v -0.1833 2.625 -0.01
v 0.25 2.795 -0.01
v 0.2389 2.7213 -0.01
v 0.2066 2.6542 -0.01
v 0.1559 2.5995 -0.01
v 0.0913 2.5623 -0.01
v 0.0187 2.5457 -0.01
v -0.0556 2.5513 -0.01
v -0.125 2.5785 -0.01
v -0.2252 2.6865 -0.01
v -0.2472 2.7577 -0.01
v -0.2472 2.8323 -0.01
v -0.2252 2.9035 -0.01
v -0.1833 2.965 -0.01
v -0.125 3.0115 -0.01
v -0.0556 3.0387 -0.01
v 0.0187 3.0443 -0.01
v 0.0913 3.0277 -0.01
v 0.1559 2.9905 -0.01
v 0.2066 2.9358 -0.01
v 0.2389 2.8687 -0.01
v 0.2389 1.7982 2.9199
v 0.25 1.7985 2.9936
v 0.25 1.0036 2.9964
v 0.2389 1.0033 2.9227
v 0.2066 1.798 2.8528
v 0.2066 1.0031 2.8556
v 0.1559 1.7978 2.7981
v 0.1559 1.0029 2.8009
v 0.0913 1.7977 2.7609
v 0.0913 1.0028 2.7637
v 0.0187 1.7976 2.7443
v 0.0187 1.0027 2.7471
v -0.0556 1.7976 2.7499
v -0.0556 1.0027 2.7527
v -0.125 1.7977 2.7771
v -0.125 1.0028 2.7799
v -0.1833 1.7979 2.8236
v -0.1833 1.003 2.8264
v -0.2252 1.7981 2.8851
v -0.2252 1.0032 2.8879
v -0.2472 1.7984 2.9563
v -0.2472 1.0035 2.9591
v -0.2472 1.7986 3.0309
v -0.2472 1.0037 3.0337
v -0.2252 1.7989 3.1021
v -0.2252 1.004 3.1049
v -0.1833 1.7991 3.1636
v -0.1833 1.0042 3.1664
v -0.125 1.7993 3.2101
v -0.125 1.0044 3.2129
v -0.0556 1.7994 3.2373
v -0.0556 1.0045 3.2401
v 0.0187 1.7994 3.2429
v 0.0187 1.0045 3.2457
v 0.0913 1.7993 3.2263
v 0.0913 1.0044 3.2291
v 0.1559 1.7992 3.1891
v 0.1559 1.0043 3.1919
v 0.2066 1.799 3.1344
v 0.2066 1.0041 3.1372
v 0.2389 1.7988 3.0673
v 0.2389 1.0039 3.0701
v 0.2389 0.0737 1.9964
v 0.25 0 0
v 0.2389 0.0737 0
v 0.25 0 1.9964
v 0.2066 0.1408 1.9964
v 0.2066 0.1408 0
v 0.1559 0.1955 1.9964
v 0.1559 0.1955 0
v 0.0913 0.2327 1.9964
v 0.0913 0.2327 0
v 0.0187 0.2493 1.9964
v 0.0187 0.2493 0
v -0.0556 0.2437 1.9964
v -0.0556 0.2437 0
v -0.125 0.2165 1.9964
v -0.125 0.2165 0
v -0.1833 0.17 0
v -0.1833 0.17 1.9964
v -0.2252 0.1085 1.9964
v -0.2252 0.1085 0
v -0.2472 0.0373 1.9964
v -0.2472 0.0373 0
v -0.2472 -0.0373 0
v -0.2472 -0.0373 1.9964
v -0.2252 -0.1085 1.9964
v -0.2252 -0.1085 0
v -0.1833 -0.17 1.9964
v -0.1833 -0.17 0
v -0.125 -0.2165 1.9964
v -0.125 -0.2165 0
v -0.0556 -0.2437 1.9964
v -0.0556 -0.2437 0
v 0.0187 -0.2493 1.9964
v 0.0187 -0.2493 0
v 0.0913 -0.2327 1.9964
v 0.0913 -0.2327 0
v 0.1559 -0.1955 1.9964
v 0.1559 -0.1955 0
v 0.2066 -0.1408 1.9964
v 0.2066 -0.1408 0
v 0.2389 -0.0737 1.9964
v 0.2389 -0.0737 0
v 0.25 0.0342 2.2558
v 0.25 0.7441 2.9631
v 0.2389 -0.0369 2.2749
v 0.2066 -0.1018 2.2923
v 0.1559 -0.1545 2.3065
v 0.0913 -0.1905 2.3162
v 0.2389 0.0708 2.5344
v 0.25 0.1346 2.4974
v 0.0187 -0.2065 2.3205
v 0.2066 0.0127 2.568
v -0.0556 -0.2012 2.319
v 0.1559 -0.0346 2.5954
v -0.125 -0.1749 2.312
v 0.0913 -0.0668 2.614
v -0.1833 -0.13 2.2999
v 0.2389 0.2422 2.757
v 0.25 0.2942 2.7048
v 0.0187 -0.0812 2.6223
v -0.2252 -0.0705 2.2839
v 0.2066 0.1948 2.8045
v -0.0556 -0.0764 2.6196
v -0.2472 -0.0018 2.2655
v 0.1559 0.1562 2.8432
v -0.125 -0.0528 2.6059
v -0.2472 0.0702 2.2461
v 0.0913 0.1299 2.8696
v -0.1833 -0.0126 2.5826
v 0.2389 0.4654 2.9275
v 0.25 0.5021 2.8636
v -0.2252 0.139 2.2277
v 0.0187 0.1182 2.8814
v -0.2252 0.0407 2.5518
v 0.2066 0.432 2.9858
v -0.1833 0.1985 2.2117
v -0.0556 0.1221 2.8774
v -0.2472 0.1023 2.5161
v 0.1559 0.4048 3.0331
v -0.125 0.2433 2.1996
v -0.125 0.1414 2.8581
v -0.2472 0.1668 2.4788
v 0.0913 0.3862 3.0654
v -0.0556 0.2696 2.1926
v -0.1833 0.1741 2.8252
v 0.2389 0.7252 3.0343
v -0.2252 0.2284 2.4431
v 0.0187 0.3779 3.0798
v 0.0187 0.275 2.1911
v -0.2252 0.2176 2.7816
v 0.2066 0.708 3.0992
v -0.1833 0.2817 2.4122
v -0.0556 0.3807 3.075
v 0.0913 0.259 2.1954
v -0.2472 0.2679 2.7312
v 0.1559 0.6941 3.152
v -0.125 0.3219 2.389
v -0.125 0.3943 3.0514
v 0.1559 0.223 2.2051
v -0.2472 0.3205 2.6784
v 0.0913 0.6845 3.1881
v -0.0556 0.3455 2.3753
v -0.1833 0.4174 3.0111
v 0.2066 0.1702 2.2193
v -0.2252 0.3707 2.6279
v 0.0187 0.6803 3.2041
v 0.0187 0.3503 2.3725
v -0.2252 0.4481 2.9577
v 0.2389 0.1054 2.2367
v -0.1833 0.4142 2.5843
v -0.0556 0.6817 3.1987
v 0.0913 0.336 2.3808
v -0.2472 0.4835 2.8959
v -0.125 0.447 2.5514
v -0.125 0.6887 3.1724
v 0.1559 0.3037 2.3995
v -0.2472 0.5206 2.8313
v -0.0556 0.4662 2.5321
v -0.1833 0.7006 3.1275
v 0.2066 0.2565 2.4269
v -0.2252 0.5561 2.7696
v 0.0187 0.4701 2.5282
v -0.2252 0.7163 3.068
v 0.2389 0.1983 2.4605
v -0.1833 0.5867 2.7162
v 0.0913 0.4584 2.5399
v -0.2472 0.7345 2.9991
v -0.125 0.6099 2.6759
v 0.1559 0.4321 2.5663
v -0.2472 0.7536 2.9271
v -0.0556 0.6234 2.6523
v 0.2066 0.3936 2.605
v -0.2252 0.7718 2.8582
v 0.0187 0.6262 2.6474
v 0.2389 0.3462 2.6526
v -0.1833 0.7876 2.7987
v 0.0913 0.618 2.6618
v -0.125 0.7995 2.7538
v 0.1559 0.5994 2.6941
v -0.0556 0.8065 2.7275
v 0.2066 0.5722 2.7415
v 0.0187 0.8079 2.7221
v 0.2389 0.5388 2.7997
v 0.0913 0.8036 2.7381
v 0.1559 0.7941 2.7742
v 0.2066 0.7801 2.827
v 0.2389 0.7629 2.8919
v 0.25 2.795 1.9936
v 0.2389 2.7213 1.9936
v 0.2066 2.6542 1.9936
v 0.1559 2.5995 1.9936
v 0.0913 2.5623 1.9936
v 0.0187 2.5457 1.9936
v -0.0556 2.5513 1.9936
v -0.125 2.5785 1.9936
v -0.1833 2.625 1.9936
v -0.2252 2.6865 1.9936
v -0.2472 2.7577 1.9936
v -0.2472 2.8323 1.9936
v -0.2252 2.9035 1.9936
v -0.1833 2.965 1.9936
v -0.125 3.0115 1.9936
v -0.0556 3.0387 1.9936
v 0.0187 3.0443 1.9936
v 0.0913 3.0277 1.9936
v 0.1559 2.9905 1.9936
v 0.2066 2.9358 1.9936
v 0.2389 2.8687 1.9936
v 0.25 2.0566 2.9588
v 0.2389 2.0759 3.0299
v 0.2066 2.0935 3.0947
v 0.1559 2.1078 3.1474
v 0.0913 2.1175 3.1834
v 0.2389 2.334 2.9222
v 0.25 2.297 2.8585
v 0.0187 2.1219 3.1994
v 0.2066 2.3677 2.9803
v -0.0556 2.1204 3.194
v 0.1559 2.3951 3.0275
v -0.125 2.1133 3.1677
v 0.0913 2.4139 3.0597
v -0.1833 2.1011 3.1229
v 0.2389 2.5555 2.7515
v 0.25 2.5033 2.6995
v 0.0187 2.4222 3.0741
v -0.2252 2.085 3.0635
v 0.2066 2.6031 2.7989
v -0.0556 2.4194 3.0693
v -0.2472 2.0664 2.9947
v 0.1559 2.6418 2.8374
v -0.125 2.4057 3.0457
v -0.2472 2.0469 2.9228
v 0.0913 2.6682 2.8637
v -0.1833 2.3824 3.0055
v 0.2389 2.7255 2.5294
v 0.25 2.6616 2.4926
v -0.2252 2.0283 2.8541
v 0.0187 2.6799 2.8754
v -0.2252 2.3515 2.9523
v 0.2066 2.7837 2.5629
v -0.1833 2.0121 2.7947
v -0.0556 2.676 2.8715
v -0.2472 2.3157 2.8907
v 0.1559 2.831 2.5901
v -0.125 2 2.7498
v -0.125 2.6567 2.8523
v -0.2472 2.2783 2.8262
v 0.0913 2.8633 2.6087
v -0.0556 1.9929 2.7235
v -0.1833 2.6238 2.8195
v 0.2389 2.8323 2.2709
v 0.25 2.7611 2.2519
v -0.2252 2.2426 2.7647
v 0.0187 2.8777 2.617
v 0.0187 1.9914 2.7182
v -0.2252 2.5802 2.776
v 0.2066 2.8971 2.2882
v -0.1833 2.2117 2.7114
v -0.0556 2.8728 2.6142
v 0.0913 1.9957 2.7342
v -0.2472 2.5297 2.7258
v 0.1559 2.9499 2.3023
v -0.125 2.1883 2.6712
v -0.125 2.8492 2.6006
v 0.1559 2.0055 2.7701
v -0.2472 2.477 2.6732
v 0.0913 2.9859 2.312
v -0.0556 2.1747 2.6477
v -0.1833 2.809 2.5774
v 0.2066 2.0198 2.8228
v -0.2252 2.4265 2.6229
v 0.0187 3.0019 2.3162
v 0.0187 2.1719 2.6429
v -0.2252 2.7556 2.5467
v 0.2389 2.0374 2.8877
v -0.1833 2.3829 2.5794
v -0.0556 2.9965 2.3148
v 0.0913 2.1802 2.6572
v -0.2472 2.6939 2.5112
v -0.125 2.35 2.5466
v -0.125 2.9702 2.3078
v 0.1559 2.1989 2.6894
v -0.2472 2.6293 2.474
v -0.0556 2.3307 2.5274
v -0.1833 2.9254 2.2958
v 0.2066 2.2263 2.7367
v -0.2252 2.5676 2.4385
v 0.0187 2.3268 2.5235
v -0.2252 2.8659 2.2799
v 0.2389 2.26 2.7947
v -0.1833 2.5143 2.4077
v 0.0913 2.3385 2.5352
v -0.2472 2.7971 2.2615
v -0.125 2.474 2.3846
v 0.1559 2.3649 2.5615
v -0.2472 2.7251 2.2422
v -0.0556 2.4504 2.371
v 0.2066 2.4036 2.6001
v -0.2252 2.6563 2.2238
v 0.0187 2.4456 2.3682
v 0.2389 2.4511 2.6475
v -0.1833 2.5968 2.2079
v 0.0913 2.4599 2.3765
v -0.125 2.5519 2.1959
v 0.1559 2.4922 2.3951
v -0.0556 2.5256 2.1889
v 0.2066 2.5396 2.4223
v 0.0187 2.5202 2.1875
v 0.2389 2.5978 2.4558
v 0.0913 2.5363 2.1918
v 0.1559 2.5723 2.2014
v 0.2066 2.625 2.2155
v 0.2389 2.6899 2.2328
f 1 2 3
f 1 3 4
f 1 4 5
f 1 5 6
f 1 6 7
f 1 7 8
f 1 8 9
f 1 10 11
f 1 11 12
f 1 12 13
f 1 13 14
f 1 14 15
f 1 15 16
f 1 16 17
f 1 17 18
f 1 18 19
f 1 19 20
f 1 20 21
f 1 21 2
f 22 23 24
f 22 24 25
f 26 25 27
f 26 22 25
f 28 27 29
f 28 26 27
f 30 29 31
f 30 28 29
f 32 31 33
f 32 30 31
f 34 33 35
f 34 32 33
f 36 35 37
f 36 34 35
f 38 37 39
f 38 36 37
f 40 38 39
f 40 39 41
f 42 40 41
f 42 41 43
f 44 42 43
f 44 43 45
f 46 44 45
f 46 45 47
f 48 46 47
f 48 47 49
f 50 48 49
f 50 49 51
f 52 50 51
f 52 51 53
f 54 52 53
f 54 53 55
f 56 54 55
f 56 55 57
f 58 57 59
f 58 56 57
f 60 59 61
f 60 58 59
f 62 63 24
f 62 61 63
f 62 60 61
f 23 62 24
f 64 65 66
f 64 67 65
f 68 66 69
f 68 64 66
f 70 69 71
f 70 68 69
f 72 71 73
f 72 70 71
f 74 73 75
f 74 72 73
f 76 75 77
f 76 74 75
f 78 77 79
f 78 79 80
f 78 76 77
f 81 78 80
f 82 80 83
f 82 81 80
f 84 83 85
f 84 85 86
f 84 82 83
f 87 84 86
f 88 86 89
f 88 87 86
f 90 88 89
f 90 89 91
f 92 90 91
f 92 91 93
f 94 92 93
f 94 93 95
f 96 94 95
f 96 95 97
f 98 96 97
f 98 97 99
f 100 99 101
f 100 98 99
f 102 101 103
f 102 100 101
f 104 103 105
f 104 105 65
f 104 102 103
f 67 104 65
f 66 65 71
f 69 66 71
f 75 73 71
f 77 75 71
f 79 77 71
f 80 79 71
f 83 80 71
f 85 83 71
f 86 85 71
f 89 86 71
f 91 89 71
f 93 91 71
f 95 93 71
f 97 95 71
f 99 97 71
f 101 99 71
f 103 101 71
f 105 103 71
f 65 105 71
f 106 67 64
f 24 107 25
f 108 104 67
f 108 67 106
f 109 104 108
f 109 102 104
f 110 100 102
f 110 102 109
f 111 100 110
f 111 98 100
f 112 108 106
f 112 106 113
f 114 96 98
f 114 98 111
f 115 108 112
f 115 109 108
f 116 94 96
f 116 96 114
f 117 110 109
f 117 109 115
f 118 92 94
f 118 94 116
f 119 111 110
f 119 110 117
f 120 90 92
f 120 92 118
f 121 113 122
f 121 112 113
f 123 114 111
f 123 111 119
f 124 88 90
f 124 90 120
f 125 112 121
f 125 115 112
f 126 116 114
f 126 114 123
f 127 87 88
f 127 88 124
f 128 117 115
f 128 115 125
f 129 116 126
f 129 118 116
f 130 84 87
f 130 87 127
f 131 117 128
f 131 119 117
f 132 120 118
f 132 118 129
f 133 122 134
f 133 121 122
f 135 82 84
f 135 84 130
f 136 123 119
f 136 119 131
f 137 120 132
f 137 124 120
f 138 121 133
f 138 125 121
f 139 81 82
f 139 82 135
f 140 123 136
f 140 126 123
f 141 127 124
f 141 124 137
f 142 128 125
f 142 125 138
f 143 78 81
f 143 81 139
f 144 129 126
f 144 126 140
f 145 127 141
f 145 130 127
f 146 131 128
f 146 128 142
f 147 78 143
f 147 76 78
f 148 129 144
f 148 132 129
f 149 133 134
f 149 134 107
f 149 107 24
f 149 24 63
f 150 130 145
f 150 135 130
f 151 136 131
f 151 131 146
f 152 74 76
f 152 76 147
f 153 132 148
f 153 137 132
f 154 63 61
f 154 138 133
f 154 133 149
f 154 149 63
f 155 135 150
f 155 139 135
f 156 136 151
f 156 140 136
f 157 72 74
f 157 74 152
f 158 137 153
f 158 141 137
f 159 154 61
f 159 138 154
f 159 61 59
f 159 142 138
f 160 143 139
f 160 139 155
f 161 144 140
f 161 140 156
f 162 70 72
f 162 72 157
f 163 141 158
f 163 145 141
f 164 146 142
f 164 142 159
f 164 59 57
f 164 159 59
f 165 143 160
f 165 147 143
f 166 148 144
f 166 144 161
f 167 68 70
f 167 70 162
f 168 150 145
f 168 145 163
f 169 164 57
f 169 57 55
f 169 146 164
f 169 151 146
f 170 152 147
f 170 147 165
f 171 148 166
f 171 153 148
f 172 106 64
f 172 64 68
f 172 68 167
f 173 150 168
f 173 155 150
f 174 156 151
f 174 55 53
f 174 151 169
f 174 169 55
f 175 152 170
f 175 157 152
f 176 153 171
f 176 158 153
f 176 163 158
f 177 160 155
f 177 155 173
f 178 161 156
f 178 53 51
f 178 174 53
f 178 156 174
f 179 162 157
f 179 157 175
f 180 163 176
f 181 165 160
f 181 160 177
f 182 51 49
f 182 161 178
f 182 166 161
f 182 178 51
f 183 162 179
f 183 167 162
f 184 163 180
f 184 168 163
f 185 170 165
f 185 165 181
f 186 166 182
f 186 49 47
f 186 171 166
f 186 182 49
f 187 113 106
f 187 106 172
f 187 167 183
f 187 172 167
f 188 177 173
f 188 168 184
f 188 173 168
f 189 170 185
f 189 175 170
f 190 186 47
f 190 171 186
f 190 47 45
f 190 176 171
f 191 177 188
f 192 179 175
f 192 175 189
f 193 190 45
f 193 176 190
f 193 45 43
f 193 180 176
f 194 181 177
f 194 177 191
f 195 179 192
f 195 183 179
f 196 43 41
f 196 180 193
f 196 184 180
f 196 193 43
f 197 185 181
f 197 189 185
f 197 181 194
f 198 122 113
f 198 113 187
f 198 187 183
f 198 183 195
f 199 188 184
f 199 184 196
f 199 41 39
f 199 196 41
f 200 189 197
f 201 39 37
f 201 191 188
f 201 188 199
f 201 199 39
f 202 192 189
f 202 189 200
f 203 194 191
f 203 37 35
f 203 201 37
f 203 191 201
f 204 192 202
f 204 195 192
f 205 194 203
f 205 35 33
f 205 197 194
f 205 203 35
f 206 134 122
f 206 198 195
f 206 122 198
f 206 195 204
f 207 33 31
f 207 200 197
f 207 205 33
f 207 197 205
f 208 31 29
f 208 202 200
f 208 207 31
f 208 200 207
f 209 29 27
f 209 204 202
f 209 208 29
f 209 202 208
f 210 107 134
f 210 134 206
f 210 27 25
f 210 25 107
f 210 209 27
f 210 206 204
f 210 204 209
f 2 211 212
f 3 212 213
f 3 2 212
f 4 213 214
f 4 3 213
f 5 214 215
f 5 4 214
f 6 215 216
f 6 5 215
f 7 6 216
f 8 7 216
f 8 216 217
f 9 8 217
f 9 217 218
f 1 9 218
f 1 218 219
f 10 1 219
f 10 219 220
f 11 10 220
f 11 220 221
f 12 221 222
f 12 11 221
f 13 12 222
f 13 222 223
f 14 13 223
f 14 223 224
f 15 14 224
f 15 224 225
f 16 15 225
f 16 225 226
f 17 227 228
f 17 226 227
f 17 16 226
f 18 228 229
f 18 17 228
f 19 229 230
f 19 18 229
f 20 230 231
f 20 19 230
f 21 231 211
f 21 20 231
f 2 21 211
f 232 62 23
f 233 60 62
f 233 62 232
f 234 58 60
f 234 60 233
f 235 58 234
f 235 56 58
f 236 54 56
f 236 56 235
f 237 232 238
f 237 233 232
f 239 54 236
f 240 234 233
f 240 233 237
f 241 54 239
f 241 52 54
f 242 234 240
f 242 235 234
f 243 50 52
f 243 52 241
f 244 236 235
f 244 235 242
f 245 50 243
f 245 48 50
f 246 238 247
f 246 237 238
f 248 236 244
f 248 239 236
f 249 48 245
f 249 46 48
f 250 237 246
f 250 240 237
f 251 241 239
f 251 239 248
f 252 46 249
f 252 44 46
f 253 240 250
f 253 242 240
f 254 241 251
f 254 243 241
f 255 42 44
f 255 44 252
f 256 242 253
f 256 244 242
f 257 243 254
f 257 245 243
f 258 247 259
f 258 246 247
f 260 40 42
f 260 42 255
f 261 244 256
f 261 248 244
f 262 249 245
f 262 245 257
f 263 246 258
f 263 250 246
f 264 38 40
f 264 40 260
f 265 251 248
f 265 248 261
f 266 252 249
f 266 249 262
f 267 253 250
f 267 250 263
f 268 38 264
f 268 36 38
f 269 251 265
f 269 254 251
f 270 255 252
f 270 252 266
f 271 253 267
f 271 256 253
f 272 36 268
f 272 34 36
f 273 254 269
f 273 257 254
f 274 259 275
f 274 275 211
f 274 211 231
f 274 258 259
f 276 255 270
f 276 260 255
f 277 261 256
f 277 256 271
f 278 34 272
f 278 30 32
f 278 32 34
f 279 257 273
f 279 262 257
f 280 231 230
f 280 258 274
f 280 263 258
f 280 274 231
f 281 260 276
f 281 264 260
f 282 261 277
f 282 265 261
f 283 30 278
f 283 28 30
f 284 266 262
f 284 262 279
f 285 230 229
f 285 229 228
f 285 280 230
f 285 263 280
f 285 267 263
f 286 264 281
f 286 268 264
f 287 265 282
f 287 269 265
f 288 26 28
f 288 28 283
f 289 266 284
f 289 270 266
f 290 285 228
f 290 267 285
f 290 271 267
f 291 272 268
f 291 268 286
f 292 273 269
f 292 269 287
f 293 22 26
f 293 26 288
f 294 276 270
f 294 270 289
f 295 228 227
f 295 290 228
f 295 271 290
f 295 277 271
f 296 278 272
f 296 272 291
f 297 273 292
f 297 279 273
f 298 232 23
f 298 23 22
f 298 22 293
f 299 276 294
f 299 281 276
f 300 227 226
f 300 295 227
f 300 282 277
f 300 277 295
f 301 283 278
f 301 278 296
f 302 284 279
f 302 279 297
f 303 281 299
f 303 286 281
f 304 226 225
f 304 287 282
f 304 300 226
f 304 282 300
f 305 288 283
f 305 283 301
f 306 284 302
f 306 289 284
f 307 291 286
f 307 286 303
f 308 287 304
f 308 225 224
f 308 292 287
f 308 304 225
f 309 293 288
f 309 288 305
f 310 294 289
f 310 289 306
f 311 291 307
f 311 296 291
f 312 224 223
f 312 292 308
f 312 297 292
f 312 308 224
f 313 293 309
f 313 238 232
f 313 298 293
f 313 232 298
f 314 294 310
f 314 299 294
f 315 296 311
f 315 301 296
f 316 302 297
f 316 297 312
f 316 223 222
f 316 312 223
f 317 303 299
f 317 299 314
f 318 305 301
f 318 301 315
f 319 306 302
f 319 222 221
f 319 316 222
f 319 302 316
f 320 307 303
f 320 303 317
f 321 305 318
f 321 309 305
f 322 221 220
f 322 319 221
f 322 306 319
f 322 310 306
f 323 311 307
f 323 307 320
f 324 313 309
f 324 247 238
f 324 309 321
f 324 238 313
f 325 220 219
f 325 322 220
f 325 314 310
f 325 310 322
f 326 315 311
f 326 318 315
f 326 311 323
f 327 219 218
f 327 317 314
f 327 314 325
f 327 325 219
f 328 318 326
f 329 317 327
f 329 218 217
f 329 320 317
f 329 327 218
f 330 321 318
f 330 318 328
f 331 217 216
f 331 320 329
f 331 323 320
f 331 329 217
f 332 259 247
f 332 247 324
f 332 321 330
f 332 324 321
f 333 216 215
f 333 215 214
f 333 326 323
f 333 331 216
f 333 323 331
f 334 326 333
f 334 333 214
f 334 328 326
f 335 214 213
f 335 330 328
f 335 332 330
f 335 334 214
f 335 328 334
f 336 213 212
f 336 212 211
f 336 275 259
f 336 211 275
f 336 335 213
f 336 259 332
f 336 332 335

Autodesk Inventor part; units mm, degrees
ref_plane "YZ Plane" through (0, 0, 0) normal (1, 0, 0) x (0, 1, 0)
ref_plane "XZ Plane" through (0, 0, 0) normal (0, 1, 0) x (-1, 0, 0)
ref_plane "XY Plane" through (0, 0, 0) normal (0, 0, 1) x (1, 0, 0)
sketch "Sketch1" plane through (0, 0, 0) normal (0, 0, 1) x (1, 0, 0)
  circle A0 centre (0, 0) radius 0.25
  dimension "d0" = 0.5
sketch3d "3D Sketch2"
  line L0 (0, 0, 0) -> (0, 0, 1.9964)
  arc A0 (0, 0, 1.9964) -> (0, 1.0036, 2.9964) centre (0, 1, 1.9964) ccw
  line L1 (0, 1.0036, 2.9964) -> (0, 1.7985, 2.9936)
  arc A1 (0, 1.7985, 2.9936) -> (0, 2.795, 1.9936) centre (0, 1.795, 1.9936) ccw
  line L2 (0, 2.795, 1.9936) -> (0, 2.795, -0.01)
  dimension "d8" = 3
  dimension "d9" = 2.795
  dimension "d10" = 3
  dimension "d5" = 1
  dimension "d6" = 1
sweep "Sweep1" add profiles "Sketch1" path "3D Sketch2"
equation "\"d6\" = d5"
properties part number "antenna_stop_3"
